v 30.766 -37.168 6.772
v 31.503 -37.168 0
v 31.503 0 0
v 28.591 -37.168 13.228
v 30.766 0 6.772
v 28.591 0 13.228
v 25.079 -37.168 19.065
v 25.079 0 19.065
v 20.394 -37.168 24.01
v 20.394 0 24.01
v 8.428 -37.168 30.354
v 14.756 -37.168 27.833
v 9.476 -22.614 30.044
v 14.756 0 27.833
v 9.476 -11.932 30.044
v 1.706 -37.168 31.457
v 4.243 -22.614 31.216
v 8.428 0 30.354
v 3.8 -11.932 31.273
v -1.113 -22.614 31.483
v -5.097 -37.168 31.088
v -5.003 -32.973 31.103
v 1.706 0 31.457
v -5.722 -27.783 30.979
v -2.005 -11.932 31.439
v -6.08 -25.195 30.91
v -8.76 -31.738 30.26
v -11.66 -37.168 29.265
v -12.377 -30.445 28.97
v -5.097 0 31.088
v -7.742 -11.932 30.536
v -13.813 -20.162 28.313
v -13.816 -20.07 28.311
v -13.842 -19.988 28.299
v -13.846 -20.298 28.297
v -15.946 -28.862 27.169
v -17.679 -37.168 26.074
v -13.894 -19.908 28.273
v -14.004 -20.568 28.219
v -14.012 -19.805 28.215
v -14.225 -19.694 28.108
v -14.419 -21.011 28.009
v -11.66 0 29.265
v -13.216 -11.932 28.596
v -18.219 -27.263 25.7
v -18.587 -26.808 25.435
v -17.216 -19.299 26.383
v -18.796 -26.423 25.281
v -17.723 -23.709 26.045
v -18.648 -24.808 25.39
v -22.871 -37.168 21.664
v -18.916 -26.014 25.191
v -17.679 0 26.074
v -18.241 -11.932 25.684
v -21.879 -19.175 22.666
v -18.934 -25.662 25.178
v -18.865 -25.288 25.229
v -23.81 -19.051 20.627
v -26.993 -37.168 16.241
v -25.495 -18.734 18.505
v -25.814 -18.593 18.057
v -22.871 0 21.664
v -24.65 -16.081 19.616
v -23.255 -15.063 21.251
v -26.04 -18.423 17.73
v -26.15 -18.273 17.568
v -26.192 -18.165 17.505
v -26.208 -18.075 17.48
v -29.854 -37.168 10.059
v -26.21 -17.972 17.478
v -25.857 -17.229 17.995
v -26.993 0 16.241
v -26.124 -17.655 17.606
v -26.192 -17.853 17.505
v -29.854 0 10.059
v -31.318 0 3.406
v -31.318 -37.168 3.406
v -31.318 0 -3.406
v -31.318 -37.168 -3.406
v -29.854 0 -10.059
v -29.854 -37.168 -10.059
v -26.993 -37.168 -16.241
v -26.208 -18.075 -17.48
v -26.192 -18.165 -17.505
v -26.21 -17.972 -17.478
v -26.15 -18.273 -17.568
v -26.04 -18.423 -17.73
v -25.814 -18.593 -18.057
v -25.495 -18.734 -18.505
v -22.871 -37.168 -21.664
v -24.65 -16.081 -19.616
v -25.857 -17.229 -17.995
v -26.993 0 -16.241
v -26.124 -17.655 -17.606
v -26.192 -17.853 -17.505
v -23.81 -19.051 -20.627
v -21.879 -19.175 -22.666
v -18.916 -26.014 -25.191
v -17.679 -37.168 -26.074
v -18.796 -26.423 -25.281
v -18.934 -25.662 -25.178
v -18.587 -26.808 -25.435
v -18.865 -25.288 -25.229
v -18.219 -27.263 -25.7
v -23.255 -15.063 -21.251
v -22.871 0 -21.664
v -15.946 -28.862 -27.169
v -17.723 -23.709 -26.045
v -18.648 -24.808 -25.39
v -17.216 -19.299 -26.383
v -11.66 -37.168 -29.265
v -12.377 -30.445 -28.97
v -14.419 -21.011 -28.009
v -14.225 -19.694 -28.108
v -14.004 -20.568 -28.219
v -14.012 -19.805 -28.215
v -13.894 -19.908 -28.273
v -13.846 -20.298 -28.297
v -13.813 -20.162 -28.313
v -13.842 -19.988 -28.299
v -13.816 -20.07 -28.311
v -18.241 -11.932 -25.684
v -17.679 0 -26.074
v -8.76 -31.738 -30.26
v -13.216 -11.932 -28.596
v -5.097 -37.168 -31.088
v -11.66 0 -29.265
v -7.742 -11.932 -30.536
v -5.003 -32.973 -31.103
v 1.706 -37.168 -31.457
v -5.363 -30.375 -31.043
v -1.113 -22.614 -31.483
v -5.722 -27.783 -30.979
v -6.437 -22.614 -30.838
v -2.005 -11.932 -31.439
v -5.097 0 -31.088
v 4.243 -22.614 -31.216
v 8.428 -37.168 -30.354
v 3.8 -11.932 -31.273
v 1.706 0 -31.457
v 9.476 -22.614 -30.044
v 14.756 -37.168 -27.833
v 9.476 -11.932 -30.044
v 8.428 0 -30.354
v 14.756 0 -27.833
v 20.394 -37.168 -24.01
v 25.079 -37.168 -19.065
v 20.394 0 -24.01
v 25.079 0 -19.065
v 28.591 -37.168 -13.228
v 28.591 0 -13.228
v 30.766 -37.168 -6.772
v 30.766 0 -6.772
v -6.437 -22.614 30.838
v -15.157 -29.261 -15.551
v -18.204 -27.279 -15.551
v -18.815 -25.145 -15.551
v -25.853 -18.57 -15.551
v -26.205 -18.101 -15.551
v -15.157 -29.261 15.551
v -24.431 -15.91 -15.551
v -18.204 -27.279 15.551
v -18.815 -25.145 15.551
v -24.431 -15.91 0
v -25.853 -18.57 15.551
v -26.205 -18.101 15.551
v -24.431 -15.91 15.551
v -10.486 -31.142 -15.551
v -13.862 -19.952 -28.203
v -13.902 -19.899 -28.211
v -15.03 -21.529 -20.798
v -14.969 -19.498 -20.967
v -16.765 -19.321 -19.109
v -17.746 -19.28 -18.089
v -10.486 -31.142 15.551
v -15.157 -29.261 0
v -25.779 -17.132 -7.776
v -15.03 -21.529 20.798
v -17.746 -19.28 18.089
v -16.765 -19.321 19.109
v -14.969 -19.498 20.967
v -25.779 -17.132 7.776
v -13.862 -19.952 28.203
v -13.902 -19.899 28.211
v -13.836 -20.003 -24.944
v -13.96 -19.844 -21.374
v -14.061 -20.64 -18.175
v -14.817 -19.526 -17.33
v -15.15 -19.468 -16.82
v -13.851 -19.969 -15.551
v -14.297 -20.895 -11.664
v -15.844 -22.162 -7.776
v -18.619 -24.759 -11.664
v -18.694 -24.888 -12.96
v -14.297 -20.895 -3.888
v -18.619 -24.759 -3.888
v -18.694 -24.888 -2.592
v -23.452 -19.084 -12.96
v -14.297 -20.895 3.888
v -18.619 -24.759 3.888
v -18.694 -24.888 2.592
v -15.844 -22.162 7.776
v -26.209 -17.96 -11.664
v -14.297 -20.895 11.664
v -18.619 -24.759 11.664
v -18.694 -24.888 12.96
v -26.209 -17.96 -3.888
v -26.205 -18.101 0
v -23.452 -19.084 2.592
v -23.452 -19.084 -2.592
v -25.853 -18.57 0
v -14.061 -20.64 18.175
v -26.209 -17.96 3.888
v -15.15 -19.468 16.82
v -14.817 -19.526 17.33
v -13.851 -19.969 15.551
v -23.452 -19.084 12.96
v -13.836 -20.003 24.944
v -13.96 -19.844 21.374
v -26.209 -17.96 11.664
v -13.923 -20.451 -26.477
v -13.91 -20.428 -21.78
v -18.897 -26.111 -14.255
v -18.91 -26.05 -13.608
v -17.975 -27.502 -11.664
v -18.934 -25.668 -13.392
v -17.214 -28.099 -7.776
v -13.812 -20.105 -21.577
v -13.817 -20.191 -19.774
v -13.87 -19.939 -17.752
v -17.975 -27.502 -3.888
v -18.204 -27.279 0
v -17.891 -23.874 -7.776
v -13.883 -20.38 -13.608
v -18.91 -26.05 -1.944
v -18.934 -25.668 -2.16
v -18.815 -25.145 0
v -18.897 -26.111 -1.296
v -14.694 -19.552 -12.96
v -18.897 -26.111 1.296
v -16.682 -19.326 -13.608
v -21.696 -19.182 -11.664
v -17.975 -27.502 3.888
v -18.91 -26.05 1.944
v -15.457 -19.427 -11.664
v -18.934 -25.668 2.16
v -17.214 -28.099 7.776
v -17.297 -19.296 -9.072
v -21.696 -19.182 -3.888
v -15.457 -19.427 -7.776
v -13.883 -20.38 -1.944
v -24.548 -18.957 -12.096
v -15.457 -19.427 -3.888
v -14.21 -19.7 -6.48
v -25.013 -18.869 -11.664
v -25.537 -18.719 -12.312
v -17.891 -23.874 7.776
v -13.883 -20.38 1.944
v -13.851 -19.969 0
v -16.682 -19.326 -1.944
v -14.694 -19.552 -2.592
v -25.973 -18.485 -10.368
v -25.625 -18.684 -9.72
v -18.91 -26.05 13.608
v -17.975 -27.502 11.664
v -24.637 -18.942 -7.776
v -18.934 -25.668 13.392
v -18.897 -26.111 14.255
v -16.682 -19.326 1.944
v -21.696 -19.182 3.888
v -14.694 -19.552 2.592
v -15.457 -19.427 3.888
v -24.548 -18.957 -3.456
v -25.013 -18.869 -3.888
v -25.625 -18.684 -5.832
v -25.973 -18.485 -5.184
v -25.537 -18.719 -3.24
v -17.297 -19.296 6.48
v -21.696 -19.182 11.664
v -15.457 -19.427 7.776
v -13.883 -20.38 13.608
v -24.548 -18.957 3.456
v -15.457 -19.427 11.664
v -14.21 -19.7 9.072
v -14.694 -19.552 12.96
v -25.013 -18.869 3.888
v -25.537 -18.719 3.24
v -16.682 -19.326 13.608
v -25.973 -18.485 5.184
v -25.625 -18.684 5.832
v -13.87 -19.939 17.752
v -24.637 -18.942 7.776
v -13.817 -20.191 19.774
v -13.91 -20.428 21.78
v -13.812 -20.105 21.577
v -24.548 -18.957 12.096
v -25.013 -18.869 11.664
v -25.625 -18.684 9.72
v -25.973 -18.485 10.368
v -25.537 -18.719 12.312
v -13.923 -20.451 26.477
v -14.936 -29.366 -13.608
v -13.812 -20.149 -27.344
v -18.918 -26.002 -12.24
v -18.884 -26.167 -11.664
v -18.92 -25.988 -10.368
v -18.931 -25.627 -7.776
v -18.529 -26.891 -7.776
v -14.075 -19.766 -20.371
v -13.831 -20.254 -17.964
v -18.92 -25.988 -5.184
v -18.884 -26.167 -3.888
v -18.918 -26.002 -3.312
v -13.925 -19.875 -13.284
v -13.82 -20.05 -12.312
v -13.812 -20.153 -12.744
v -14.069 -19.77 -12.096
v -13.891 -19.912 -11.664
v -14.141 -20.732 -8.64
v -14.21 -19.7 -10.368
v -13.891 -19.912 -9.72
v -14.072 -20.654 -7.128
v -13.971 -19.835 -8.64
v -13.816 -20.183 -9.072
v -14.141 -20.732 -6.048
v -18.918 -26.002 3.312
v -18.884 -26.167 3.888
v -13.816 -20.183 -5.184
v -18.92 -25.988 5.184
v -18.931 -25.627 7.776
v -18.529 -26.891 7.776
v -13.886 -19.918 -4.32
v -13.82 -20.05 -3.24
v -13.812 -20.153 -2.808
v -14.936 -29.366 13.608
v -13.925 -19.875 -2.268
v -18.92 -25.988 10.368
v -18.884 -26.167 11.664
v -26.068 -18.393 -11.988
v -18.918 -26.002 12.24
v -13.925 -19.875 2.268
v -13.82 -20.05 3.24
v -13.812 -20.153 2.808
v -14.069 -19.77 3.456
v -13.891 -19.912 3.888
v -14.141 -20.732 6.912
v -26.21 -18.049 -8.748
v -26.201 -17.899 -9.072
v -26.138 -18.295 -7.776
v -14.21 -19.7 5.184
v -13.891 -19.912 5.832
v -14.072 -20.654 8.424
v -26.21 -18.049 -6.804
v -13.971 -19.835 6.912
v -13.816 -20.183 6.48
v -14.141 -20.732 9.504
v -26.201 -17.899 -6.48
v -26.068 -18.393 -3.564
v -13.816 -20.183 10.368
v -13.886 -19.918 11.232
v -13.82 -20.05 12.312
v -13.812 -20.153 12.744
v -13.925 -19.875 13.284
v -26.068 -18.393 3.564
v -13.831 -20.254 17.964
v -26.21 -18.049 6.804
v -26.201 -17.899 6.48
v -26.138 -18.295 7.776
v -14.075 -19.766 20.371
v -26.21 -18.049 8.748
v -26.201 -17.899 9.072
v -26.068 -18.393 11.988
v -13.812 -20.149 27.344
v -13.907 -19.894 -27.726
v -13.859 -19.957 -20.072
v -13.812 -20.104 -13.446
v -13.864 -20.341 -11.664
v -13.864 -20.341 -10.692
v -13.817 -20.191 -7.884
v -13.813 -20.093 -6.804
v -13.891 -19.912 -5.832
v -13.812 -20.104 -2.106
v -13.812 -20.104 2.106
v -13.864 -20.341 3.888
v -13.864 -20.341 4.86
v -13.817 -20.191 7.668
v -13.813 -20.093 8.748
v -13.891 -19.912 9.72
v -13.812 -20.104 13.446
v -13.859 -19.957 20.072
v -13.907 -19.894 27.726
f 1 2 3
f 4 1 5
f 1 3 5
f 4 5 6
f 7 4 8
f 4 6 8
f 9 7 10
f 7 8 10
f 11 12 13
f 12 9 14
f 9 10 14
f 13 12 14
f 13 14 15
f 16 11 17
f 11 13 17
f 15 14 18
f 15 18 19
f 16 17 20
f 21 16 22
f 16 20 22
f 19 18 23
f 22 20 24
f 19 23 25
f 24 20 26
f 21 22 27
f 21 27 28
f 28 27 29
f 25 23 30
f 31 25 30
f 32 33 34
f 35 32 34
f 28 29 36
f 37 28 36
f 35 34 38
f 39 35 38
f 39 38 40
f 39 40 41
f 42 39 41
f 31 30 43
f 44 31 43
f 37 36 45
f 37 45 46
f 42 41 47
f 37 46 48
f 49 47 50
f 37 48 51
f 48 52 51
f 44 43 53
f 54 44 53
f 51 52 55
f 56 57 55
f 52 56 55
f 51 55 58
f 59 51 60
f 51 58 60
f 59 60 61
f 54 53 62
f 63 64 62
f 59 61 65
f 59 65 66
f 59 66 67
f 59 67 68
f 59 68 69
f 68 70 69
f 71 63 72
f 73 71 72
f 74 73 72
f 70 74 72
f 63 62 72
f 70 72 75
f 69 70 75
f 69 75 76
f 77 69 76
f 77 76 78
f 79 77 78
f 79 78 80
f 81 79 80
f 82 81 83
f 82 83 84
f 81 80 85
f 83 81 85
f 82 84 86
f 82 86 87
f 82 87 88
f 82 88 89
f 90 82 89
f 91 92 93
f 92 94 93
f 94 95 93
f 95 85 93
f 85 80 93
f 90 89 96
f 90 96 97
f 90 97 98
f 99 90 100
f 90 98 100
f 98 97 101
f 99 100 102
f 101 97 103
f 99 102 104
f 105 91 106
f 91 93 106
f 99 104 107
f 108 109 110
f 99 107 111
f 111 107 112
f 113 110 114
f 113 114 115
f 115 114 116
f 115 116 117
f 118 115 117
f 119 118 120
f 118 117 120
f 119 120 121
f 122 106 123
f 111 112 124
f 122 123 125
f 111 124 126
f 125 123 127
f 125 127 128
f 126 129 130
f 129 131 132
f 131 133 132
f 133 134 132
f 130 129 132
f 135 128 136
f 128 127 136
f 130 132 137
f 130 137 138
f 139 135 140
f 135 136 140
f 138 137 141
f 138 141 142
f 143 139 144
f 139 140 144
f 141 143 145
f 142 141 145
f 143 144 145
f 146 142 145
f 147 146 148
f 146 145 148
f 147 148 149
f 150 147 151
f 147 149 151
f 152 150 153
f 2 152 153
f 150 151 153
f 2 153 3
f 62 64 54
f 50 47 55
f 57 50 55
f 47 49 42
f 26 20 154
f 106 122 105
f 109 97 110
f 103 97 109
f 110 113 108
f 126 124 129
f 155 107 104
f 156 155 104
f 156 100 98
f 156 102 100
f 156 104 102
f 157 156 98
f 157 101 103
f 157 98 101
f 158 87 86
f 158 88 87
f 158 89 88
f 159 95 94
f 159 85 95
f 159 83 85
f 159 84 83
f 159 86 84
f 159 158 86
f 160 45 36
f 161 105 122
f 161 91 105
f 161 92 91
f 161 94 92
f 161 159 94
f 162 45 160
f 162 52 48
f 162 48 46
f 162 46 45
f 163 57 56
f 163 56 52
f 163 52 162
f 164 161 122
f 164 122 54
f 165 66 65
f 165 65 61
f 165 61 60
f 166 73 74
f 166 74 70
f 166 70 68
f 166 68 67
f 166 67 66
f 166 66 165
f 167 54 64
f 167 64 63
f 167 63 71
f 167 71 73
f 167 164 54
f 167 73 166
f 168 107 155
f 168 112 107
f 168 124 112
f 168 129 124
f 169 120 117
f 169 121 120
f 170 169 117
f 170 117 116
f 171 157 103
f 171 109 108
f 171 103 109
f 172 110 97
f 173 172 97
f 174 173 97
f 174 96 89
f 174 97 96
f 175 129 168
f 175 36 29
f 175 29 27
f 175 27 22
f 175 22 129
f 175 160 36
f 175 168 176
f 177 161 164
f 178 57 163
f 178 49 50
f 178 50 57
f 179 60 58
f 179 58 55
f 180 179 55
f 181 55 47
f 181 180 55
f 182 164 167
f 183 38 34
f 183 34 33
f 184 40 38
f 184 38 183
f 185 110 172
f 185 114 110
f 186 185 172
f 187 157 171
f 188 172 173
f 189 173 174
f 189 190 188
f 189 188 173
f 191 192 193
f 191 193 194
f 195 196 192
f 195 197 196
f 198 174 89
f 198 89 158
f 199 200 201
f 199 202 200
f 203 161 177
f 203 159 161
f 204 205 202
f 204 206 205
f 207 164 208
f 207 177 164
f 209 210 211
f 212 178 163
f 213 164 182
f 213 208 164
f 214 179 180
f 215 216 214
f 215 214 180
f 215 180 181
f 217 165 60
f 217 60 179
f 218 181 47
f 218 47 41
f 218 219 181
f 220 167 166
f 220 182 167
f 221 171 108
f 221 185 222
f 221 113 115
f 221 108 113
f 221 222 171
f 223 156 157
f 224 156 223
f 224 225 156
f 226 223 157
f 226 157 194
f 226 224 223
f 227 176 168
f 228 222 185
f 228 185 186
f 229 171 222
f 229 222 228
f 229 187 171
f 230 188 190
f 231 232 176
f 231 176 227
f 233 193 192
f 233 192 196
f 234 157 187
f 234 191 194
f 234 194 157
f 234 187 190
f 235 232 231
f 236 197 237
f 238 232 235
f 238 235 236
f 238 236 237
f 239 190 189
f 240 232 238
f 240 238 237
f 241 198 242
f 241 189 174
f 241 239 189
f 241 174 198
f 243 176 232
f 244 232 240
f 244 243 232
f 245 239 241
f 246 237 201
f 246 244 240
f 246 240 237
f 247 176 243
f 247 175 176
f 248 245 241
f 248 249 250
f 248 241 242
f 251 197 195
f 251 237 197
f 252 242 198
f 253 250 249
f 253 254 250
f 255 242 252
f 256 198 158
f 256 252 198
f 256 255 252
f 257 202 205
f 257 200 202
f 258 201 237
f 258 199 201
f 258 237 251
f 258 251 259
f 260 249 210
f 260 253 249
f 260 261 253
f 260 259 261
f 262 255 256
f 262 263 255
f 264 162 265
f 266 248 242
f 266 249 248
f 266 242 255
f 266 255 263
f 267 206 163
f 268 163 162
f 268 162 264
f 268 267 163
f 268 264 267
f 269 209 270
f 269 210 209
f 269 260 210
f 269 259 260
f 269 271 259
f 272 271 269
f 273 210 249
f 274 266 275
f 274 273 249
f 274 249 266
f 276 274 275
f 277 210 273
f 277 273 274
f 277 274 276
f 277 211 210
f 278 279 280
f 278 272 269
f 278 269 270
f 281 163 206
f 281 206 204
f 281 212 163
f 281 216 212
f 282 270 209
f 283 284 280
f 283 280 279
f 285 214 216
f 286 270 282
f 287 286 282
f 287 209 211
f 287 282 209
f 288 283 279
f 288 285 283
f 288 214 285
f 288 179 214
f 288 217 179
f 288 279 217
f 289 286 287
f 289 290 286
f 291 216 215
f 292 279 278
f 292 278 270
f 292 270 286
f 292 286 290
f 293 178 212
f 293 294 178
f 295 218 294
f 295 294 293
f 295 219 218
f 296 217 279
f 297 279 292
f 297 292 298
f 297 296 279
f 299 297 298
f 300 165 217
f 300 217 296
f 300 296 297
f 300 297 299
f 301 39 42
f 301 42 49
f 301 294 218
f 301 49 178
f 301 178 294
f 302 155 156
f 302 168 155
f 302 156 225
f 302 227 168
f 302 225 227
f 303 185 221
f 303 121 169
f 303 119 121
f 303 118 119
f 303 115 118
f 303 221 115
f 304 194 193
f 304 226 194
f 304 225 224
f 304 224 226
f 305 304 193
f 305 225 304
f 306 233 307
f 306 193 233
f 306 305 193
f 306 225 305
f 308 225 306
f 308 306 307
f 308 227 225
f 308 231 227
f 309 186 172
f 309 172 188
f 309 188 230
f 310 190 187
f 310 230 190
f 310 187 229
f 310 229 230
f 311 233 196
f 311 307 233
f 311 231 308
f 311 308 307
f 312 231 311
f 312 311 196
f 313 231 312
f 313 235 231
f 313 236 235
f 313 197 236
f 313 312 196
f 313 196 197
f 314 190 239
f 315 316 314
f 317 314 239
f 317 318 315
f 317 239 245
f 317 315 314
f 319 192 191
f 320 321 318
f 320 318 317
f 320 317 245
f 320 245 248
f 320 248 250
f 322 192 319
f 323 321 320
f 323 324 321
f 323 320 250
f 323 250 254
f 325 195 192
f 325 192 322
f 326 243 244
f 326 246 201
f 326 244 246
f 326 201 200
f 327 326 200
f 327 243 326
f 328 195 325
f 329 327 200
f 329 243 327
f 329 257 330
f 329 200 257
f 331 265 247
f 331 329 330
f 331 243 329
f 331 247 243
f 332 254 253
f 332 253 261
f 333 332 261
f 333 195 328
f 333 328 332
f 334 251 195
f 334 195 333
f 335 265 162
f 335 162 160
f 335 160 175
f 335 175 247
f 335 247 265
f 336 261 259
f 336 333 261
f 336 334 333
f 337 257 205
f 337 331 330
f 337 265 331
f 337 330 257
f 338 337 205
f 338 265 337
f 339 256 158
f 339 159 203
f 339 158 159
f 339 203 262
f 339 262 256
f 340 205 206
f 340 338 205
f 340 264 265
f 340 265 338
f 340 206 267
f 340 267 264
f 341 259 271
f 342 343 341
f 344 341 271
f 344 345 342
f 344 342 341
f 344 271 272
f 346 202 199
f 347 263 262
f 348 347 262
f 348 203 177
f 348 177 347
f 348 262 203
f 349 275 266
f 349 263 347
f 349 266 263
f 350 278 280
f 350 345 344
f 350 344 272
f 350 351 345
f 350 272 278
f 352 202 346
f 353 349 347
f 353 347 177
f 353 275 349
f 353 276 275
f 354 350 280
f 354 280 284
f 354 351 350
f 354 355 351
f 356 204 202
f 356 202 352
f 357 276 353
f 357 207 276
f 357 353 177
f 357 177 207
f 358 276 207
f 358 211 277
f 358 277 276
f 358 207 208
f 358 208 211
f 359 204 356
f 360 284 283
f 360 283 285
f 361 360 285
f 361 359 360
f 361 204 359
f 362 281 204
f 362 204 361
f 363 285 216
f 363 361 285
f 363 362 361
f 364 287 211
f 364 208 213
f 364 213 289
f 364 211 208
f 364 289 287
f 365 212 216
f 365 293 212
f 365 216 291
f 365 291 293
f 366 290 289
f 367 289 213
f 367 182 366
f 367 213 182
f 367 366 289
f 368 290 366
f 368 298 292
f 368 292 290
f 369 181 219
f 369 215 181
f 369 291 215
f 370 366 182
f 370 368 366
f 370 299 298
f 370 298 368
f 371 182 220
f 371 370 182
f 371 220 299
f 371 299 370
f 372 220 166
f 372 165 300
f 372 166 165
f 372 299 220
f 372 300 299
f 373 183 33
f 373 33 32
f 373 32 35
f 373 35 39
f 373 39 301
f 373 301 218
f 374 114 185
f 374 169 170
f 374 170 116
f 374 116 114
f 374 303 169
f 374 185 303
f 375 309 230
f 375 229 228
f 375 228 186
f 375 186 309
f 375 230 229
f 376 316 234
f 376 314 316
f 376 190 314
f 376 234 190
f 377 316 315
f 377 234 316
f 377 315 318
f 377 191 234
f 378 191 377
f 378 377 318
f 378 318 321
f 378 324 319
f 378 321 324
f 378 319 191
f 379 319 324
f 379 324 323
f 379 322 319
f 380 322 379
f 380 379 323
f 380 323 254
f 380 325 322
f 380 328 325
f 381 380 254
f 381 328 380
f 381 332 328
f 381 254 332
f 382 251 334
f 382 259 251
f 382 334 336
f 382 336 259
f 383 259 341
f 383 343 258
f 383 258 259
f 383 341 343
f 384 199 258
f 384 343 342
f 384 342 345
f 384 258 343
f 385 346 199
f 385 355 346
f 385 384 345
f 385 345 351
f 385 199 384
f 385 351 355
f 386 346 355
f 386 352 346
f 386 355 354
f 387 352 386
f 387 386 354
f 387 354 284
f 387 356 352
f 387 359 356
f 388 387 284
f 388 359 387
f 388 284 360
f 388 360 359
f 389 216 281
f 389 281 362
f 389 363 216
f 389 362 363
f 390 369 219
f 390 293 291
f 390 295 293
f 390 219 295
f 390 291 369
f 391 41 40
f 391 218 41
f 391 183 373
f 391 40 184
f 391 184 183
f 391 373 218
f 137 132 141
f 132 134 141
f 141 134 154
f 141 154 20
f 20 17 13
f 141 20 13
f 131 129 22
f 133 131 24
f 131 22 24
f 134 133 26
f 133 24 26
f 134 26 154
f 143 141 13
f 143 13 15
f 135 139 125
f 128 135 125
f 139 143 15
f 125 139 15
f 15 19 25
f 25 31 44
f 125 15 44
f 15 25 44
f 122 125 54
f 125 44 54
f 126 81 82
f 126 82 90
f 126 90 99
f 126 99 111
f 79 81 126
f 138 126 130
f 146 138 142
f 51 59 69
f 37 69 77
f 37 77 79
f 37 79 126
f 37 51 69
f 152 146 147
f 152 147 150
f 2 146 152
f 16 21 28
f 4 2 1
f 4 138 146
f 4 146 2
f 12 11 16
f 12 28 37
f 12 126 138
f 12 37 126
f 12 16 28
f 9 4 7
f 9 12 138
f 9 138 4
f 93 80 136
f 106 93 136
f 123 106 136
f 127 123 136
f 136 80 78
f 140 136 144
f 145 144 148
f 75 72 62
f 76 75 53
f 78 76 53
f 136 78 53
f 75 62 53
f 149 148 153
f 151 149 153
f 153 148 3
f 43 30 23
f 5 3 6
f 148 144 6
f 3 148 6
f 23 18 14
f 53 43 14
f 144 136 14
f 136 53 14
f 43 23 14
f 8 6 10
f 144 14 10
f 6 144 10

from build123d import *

# Parameters (mm, degrees)
F0_R     = 31.5027066434
F1_DEPTH = 37.1684301645
F4_DEPTH = 140.3979789466


with BuildPart() as f1:
    # F0 (on Front) → F1 (new body)
    with BuildSketch(Plane.XZ):
        Circle(F0_R)
    extrude(amount=F1_DEPTH)

    # F3 (on offset) → F4 (cut)
    with BuildSketch(Plane.XY.offset(84.0610545129)):
        with BuildLine():
            Line((9.4761028886, -11.9315292686), (-18.2410087436, -11.9315292686))
            add(Edge.make_bspline(
                [(-5.0031961873, -32.9731814563), (-12.4940646133, -30.5432269053), (-25.0192888489, -26.480178078), (-7.2338399017, -18.0056457647), (-32.6465906732, -20.5892809625), (-22.8973603016, -14.7299965076), (-18.2410087436, -11.9315292686)],
                knots=[0, 0, 0, 0, 0.2992192325, 0.500314683, 0.7613447444, 1, 1, 1, 1], degree=3))
            Line((-5.0031961873, -32.9731814563), (-6.4374888316, -22.614127025))
            Line((-6.4374888316, -22.614127025), (9.4761028886, -22.614127025))
            Line((9.4761028886, -22.614127025), (9.4761028886, -11.9315292686))
        make_face()
    extrude(amount=-F4_DEPTH, mode=Mode.SUBTRACT)


solid = f1.part
